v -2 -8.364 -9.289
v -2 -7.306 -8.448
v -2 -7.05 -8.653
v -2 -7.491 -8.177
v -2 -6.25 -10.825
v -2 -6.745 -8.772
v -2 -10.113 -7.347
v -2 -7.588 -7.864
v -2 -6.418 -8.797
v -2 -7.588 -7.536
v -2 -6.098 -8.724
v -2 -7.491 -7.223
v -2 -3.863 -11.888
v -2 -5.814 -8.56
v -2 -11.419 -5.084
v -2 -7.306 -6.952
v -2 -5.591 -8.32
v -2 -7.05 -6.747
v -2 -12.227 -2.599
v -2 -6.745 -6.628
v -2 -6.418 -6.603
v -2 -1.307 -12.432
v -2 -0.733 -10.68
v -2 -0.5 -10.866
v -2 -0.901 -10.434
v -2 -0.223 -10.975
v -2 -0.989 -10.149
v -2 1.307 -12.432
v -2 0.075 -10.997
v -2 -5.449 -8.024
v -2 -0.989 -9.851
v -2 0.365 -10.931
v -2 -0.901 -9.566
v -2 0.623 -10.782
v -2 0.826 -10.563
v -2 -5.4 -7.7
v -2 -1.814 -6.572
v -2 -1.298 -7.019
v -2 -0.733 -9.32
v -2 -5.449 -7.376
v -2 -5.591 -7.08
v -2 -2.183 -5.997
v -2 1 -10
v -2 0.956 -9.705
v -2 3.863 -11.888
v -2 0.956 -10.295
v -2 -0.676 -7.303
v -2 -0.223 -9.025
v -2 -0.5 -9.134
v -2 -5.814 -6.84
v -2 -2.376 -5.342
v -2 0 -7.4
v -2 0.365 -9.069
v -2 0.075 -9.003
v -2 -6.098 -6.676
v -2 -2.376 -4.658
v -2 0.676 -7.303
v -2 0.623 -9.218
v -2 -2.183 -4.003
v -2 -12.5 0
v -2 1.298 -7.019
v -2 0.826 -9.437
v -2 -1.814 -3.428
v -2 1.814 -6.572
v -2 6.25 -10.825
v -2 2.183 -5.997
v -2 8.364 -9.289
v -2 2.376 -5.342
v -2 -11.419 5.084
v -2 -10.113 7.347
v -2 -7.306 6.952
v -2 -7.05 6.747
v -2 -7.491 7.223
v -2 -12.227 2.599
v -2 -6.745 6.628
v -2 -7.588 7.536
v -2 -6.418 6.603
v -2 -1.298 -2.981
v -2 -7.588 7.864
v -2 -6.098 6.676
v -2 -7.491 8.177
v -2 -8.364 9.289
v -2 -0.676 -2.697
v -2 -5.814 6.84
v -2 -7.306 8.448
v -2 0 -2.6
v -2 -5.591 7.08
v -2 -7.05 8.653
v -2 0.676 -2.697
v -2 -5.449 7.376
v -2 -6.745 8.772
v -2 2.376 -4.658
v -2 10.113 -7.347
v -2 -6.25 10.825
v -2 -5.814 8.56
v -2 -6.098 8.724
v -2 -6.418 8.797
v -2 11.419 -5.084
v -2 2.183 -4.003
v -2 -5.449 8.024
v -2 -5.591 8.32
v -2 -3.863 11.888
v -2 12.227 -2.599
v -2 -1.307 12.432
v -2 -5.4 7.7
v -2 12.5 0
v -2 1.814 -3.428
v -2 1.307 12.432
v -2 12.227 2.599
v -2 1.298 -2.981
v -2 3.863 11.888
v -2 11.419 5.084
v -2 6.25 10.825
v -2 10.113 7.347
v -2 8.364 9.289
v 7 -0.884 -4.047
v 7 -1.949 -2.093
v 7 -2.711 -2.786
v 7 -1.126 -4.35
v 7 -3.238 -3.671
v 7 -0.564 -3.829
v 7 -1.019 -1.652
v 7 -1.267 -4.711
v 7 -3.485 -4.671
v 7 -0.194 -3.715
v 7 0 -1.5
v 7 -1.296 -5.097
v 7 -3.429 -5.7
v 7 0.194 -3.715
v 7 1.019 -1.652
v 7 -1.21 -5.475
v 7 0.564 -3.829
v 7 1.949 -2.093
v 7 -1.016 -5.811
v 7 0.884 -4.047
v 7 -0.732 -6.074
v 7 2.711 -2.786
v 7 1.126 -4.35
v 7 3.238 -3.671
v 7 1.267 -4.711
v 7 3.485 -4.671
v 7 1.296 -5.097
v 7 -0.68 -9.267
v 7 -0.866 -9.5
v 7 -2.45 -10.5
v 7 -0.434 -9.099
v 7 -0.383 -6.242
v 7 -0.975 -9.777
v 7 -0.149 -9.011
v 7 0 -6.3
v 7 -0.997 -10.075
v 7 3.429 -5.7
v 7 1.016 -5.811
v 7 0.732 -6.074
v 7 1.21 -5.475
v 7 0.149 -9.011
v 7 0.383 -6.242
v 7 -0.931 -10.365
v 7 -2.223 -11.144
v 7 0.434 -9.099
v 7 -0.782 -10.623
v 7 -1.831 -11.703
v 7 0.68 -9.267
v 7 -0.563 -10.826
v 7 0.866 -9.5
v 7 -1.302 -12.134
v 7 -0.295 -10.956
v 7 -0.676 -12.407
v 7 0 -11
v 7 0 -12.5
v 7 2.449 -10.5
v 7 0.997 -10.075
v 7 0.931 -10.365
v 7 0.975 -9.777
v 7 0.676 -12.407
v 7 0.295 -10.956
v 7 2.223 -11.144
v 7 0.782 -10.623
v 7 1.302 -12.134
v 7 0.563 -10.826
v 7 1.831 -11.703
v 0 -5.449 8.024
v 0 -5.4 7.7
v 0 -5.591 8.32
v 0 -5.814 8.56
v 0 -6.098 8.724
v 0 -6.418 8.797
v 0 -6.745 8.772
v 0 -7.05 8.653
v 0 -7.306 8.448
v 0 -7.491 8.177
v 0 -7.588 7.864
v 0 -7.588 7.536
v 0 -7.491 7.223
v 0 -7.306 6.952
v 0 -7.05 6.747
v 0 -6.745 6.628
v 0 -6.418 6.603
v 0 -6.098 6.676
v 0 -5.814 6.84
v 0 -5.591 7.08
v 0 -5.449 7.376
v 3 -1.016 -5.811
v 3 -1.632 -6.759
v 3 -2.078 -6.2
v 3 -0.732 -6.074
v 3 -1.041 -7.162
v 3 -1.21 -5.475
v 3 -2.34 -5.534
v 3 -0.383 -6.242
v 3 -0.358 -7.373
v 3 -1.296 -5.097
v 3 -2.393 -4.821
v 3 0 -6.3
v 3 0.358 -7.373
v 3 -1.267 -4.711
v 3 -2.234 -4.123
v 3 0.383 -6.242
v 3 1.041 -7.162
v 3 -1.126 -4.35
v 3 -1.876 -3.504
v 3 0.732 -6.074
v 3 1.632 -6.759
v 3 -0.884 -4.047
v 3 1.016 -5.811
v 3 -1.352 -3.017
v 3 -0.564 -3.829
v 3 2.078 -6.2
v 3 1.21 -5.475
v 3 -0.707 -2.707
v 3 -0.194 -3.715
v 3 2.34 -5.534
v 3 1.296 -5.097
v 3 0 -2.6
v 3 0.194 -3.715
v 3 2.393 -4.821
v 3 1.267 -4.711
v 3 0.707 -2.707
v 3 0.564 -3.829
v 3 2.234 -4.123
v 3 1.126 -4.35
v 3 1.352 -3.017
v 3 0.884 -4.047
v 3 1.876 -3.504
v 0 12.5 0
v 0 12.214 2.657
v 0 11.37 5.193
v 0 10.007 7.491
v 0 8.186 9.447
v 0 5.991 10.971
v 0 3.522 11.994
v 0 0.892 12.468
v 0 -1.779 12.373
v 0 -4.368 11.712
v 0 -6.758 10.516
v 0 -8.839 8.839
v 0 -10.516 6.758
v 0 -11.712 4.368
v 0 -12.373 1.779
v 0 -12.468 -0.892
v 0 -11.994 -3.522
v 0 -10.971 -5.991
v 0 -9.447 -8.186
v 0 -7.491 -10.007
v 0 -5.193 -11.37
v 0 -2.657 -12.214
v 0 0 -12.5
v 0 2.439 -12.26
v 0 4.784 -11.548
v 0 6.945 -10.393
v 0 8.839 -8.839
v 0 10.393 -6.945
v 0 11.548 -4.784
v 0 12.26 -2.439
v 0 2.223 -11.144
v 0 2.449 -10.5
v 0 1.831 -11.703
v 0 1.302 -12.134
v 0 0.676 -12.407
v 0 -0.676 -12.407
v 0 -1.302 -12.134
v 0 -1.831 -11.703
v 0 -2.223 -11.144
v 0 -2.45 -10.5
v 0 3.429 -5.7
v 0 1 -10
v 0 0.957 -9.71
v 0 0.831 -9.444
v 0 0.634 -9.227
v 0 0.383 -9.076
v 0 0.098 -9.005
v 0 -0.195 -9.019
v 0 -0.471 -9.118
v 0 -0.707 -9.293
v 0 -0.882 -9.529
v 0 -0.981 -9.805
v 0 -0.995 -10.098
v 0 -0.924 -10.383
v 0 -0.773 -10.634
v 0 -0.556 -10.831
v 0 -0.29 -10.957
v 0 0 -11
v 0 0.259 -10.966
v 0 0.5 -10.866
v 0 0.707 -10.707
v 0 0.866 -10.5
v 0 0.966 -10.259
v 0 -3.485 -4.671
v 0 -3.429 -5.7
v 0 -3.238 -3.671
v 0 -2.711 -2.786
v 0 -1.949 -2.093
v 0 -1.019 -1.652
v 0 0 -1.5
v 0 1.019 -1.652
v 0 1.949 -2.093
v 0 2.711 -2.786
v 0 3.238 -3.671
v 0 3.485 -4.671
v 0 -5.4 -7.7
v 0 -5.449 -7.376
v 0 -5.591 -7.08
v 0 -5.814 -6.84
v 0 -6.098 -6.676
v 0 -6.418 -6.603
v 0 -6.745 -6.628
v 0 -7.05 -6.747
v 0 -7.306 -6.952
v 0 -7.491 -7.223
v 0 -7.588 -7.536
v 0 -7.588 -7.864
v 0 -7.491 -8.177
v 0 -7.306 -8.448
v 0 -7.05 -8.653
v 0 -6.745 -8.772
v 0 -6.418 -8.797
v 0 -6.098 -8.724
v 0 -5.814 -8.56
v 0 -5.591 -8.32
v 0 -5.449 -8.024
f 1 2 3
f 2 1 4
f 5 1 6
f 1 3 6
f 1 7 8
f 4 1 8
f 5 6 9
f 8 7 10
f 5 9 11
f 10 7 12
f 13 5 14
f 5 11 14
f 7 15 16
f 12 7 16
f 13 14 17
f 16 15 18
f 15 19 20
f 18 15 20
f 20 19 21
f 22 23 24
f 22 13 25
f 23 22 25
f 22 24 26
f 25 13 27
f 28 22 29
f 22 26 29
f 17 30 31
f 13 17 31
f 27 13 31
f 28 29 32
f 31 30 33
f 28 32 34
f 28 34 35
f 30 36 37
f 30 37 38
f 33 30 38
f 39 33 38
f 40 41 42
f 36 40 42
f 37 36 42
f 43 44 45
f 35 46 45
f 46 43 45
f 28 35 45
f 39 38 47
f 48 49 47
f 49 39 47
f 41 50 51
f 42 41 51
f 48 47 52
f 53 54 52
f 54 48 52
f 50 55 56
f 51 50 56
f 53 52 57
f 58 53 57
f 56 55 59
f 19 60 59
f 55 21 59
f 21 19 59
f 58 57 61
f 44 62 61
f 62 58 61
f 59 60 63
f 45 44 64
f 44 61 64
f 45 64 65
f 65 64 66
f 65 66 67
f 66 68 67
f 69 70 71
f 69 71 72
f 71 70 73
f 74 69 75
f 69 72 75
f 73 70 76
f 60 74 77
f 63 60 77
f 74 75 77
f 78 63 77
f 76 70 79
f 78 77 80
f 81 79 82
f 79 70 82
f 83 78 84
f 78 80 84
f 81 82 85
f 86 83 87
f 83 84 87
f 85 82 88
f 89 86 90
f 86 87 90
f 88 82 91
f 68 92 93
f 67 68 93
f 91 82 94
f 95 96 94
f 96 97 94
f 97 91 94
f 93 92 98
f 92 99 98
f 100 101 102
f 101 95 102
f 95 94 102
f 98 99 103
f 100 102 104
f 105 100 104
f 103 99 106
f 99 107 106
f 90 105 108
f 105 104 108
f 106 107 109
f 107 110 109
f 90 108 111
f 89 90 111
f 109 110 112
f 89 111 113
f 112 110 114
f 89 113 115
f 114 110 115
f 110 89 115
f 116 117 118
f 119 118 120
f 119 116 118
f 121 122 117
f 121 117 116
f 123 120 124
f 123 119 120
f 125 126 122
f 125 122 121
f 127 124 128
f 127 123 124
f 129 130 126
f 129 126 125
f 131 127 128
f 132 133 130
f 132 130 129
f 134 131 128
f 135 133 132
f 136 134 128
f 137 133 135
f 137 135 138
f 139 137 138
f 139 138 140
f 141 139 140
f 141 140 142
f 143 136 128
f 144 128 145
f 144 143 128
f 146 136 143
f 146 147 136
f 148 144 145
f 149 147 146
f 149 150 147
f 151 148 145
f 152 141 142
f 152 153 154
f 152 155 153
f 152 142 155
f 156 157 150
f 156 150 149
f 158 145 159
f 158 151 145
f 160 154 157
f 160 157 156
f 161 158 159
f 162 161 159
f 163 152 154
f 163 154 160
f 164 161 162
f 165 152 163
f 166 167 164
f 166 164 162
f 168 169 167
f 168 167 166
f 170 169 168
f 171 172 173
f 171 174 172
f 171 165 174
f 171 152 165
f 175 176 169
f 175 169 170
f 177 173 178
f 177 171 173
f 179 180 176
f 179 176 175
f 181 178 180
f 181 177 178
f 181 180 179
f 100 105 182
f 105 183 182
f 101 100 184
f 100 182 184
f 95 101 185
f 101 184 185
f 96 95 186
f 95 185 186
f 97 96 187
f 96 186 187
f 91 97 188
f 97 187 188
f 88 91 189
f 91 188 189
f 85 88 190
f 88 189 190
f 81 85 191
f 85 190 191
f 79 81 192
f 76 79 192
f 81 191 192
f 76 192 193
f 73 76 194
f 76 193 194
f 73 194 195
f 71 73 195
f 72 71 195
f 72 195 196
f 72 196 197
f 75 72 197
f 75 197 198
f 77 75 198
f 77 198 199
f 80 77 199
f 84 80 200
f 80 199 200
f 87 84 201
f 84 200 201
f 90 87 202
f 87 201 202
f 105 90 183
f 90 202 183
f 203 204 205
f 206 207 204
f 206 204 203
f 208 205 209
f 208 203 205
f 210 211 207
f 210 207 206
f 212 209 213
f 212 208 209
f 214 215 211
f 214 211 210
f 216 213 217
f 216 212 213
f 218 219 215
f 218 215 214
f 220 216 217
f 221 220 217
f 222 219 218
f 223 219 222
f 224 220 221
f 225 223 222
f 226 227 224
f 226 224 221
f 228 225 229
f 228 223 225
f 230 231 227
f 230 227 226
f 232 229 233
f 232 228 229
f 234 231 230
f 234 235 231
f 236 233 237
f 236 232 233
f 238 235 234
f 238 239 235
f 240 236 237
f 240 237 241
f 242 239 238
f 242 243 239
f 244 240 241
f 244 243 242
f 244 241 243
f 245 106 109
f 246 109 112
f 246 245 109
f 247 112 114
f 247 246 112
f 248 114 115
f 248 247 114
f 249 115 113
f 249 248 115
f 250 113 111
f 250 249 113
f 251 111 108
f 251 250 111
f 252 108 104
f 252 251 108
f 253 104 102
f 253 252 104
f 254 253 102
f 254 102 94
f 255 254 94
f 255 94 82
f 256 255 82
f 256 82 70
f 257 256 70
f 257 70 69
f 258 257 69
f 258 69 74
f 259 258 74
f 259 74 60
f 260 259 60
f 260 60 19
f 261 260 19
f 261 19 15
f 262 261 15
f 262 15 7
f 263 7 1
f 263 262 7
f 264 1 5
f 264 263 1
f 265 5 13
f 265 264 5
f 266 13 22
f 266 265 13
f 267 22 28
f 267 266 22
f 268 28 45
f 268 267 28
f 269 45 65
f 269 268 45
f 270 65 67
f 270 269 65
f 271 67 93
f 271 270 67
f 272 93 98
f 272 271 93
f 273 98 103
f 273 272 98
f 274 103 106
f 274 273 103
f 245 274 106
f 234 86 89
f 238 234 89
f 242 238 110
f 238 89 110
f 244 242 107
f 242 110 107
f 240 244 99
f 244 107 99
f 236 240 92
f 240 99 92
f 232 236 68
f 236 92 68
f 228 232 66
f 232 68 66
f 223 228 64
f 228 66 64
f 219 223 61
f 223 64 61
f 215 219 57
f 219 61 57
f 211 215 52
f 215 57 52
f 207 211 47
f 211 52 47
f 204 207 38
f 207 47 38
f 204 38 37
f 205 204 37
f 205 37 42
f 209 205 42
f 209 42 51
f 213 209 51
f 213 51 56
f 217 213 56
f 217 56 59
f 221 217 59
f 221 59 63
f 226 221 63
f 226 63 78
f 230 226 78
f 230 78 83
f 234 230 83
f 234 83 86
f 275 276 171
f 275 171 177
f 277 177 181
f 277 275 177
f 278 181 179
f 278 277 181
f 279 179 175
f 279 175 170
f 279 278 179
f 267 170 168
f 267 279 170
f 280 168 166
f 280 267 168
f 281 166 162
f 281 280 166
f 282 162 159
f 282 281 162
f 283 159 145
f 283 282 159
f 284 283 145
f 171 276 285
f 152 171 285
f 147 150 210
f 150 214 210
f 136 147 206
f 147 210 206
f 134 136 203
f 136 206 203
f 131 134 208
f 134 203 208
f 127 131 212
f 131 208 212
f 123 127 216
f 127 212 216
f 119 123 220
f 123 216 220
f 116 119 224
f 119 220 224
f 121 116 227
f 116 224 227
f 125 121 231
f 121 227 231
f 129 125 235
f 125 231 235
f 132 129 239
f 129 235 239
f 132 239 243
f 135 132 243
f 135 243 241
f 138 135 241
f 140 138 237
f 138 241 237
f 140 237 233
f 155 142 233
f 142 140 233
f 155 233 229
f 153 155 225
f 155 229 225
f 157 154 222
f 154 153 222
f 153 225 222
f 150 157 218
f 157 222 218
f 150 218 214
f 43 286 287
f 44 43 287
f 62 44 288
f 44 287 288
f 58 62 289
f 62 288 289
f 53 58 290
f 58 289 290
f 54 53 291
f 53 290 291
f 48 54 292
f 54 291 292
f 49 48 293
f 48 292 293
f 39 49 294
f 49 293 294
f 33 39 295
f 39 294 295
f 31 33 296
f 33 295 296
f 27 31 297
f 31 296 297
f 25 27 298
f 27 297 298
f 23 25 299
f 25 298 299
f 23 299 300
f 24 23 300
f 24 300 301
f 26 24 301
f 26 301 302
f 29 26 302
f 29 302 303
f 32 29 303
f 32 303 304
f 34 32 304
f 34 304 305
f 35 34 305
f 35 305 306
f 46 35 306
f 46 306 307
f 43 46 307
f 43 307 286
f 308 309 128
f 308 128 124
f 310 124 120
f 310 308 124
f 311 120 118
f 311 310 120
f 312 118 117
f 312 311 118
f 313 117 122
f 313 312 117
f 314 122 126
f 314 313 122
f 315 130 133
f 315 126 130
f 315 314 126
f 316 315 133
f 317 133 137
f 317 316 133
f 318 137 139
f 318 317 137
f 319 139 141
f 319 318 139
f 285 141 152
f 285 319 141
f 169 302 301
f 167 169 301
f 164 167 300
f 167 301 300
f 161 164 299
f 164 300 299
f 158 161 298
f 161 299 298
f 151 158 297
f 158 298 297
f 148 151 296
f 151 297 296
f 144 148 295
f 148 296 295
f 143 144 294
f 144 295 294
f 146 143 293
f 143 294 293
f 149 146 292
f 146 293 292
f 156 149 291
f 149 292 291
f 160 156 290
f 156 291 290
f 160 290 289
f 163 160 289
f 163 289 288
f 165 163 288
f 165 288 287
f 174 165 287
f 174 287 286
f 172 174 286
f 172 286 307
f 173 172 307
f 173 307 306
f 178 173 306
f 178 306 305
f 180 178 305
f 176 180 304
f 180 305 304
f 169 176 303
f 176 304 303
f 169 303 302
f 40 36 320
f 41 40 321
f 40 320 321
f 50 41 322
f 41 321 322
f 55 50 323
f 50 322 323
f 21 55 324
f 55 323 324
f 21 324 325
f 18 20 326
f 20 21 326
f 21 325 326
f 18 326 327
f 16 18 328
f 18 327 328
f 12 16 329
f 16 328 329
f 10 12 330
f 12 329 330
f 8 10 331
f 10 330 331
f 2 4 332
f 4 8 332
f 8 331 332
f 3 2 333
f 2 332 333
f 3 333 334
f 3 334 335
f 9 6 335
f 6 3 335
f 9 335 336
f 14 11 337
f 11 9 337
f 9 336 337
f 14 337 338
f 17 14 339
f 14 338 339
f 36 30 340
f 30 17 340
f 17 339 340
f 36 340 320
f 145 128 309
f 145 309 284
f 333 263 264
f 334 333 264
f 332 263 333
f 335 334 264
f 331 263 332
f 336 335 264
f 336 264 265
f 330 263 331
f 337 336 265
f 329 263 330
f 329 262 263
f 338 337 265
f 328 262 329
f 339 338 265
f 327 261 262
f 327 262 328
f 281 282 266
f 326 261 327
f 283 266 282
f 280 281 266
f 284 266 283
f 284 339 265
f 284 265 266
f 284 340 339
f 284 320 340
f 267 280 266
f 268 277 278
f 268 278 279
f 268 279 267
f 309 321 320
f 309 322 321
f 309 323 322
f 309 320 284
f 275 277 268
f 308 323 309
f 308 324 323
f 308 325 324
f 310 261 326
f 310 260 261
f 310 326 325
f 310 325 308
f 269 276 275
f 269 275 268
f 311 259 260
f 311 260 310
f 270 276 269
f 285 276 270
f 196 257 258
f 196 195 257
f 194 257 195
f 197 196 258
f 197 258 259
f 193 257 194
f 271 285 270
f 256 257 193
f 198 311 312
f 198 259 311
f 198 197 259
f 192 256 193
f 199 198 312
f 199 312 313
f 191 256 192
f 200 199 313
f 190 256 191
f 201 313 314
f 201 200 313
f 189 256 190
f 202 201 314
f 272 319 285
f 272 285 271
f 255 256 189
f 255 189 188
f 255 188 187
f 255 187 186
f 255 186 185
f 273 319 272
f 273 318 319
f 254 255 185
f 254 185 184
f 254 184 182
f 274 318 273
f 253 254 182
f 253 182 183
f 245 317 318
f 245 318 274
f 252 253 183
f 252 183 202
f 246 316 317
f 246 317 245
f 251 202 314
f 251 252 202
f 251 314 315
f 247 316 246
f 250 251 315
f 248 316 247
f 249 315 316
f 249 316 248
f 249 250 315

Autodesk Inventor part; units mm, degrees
ref_plane "YZ Plane" through (0, 0, 0) normal (1, 0, 0) x (0, 1, 0)
ref_plane "XZ Plane" through (0, 0, 0) normal (0, 1, 0) x (-1, 0, 0)
ref_plane "XY Plane" through (0, 0, 0) normal (0, 0, 1) x (1, 0, 0)
sketch "スケッチ1" plane through (0, 0, 0) normal (1, 0, 0) x (0, 1, 0)
  circle A0 centre (0, 0) radius 10
  circle A1 centre (0, 0) radius 12.5
  circle A2 centre (0, -5) radius 1.3
  circle A3 centre (0, -10) radius 1
  circle A4 centre (0, -5) radius 3.5
  circle A5 centre (0, -10) radius 2.5
  circle A6 centre (-6.5, 7.7) radius 1.1
  circle A7 centre (-6.5, -7.7) radius 1.1
  line L0 (-6.5, 7.7) -> (-6.5, -7.7)
  line L1 (0, -5) -> (0, -10)
  line L2 (3.5006, -5.3506) -> (2.4495, -10.5)
  line L3 (-3.6097, -4.8161) -> (-2.4495, -10.5)
  dimension "d0" = 20
  dimension "d1" = 25
  dimension "d2" = 2.6
  dimension "d3" = 2
  dimension "d4" = 5
  dimension "d5" = 7
  dimension "d6" = 5
  dimension "d7" = 2.2
  dimension "d8" = 2.2
  dimension "d9" = 15.4
  dimension "d10" = 7.7
  dimension "d12" = 10
  dimension "d13" = 0
  dimension "d14" = 6.5
  dimension "d15" = 3.5
  dimension "d16" = 3.5
extrude "押し出し1" add sketch "スケッチ1" against normal blind 2 contours A0 L2 A4 L3 A7 L0 A6 | A1 | L2 A5 A0 | A0 A5 A4 L2 | A6 L0 A7 A0 | A5 A0 A3 | A0 A3 L1 A4 A5 | A4 A5 | A4 L1 A5 | A3 A0 A5 A4 L1 | A4 A5 L1 | A4 A5 A0 L3 | L3 A0 A5
sketch "スケッチ2" plane through (0, 0, 0) normal (1, 0, 0) x (0, 0, -1)
  circle A0 centre (5, 0) radius 1.3 projected
  circle A1 centre (5, 0) radius 1.3
  circle A2 centre (5, 0) radius 3.5
  circle A3 centre (10, 0) radius 1 projected
  circle A4 centre (10, 0) radius 1
  circle A5 centre (10, 0) radius 2.5
  line L0 (10.9311, 2.3615) -> (5.7, 3.4293)
  line L1 (5.0718, -3.5575) -> (10.5, -2.4495)
  point P0 (0, 0)
  point P1 (5.7, -3.4293)
  point P2 (10.5, 2.4495)
  dimension "d19" = 7
  dimension "d20" = 5
  dimension "d21" = 2.5
  dimension "d22" = 3.5
extrude "押し出し2" add sketch "スケッチ2" along normal blind 7
sketch "スケッチ3" plane through (-2, 0, 0) normal (-1, 0, 0) x (0, 0, 1)
  circle A0 centre (-5, 0) radius 1.3 projected
  circle A1 centre (-5, 0) radius 1.3
  circle A2 centre (-5, 0) radius 2.4
  point P0 (0, 0)
  dimension "d25" = 4.8
extrude "押し出し3" cut sketch "スケッチ3" against normal blind 5
sketch "スケッチ5" plane through (-2, 0, 0) normal (-1, 0, 0) x (0, 0, 1)
  circle A0 centre (0, 0) radius 12.5 projected
  point P0 (-12.5, 0)
ref_plane "作業平面2" through (-2, 0, -12.5) normal (0, 0, -1) x (-1, 0, 0)
equation "\"d8\" = d7"
equation "\"d10\" = 0.5 * d9"
equation "\"d15\" = 0.5 * d5"
equation "\"d16\" = d15"
properties part number "RSFF_mount_1_clearance"
